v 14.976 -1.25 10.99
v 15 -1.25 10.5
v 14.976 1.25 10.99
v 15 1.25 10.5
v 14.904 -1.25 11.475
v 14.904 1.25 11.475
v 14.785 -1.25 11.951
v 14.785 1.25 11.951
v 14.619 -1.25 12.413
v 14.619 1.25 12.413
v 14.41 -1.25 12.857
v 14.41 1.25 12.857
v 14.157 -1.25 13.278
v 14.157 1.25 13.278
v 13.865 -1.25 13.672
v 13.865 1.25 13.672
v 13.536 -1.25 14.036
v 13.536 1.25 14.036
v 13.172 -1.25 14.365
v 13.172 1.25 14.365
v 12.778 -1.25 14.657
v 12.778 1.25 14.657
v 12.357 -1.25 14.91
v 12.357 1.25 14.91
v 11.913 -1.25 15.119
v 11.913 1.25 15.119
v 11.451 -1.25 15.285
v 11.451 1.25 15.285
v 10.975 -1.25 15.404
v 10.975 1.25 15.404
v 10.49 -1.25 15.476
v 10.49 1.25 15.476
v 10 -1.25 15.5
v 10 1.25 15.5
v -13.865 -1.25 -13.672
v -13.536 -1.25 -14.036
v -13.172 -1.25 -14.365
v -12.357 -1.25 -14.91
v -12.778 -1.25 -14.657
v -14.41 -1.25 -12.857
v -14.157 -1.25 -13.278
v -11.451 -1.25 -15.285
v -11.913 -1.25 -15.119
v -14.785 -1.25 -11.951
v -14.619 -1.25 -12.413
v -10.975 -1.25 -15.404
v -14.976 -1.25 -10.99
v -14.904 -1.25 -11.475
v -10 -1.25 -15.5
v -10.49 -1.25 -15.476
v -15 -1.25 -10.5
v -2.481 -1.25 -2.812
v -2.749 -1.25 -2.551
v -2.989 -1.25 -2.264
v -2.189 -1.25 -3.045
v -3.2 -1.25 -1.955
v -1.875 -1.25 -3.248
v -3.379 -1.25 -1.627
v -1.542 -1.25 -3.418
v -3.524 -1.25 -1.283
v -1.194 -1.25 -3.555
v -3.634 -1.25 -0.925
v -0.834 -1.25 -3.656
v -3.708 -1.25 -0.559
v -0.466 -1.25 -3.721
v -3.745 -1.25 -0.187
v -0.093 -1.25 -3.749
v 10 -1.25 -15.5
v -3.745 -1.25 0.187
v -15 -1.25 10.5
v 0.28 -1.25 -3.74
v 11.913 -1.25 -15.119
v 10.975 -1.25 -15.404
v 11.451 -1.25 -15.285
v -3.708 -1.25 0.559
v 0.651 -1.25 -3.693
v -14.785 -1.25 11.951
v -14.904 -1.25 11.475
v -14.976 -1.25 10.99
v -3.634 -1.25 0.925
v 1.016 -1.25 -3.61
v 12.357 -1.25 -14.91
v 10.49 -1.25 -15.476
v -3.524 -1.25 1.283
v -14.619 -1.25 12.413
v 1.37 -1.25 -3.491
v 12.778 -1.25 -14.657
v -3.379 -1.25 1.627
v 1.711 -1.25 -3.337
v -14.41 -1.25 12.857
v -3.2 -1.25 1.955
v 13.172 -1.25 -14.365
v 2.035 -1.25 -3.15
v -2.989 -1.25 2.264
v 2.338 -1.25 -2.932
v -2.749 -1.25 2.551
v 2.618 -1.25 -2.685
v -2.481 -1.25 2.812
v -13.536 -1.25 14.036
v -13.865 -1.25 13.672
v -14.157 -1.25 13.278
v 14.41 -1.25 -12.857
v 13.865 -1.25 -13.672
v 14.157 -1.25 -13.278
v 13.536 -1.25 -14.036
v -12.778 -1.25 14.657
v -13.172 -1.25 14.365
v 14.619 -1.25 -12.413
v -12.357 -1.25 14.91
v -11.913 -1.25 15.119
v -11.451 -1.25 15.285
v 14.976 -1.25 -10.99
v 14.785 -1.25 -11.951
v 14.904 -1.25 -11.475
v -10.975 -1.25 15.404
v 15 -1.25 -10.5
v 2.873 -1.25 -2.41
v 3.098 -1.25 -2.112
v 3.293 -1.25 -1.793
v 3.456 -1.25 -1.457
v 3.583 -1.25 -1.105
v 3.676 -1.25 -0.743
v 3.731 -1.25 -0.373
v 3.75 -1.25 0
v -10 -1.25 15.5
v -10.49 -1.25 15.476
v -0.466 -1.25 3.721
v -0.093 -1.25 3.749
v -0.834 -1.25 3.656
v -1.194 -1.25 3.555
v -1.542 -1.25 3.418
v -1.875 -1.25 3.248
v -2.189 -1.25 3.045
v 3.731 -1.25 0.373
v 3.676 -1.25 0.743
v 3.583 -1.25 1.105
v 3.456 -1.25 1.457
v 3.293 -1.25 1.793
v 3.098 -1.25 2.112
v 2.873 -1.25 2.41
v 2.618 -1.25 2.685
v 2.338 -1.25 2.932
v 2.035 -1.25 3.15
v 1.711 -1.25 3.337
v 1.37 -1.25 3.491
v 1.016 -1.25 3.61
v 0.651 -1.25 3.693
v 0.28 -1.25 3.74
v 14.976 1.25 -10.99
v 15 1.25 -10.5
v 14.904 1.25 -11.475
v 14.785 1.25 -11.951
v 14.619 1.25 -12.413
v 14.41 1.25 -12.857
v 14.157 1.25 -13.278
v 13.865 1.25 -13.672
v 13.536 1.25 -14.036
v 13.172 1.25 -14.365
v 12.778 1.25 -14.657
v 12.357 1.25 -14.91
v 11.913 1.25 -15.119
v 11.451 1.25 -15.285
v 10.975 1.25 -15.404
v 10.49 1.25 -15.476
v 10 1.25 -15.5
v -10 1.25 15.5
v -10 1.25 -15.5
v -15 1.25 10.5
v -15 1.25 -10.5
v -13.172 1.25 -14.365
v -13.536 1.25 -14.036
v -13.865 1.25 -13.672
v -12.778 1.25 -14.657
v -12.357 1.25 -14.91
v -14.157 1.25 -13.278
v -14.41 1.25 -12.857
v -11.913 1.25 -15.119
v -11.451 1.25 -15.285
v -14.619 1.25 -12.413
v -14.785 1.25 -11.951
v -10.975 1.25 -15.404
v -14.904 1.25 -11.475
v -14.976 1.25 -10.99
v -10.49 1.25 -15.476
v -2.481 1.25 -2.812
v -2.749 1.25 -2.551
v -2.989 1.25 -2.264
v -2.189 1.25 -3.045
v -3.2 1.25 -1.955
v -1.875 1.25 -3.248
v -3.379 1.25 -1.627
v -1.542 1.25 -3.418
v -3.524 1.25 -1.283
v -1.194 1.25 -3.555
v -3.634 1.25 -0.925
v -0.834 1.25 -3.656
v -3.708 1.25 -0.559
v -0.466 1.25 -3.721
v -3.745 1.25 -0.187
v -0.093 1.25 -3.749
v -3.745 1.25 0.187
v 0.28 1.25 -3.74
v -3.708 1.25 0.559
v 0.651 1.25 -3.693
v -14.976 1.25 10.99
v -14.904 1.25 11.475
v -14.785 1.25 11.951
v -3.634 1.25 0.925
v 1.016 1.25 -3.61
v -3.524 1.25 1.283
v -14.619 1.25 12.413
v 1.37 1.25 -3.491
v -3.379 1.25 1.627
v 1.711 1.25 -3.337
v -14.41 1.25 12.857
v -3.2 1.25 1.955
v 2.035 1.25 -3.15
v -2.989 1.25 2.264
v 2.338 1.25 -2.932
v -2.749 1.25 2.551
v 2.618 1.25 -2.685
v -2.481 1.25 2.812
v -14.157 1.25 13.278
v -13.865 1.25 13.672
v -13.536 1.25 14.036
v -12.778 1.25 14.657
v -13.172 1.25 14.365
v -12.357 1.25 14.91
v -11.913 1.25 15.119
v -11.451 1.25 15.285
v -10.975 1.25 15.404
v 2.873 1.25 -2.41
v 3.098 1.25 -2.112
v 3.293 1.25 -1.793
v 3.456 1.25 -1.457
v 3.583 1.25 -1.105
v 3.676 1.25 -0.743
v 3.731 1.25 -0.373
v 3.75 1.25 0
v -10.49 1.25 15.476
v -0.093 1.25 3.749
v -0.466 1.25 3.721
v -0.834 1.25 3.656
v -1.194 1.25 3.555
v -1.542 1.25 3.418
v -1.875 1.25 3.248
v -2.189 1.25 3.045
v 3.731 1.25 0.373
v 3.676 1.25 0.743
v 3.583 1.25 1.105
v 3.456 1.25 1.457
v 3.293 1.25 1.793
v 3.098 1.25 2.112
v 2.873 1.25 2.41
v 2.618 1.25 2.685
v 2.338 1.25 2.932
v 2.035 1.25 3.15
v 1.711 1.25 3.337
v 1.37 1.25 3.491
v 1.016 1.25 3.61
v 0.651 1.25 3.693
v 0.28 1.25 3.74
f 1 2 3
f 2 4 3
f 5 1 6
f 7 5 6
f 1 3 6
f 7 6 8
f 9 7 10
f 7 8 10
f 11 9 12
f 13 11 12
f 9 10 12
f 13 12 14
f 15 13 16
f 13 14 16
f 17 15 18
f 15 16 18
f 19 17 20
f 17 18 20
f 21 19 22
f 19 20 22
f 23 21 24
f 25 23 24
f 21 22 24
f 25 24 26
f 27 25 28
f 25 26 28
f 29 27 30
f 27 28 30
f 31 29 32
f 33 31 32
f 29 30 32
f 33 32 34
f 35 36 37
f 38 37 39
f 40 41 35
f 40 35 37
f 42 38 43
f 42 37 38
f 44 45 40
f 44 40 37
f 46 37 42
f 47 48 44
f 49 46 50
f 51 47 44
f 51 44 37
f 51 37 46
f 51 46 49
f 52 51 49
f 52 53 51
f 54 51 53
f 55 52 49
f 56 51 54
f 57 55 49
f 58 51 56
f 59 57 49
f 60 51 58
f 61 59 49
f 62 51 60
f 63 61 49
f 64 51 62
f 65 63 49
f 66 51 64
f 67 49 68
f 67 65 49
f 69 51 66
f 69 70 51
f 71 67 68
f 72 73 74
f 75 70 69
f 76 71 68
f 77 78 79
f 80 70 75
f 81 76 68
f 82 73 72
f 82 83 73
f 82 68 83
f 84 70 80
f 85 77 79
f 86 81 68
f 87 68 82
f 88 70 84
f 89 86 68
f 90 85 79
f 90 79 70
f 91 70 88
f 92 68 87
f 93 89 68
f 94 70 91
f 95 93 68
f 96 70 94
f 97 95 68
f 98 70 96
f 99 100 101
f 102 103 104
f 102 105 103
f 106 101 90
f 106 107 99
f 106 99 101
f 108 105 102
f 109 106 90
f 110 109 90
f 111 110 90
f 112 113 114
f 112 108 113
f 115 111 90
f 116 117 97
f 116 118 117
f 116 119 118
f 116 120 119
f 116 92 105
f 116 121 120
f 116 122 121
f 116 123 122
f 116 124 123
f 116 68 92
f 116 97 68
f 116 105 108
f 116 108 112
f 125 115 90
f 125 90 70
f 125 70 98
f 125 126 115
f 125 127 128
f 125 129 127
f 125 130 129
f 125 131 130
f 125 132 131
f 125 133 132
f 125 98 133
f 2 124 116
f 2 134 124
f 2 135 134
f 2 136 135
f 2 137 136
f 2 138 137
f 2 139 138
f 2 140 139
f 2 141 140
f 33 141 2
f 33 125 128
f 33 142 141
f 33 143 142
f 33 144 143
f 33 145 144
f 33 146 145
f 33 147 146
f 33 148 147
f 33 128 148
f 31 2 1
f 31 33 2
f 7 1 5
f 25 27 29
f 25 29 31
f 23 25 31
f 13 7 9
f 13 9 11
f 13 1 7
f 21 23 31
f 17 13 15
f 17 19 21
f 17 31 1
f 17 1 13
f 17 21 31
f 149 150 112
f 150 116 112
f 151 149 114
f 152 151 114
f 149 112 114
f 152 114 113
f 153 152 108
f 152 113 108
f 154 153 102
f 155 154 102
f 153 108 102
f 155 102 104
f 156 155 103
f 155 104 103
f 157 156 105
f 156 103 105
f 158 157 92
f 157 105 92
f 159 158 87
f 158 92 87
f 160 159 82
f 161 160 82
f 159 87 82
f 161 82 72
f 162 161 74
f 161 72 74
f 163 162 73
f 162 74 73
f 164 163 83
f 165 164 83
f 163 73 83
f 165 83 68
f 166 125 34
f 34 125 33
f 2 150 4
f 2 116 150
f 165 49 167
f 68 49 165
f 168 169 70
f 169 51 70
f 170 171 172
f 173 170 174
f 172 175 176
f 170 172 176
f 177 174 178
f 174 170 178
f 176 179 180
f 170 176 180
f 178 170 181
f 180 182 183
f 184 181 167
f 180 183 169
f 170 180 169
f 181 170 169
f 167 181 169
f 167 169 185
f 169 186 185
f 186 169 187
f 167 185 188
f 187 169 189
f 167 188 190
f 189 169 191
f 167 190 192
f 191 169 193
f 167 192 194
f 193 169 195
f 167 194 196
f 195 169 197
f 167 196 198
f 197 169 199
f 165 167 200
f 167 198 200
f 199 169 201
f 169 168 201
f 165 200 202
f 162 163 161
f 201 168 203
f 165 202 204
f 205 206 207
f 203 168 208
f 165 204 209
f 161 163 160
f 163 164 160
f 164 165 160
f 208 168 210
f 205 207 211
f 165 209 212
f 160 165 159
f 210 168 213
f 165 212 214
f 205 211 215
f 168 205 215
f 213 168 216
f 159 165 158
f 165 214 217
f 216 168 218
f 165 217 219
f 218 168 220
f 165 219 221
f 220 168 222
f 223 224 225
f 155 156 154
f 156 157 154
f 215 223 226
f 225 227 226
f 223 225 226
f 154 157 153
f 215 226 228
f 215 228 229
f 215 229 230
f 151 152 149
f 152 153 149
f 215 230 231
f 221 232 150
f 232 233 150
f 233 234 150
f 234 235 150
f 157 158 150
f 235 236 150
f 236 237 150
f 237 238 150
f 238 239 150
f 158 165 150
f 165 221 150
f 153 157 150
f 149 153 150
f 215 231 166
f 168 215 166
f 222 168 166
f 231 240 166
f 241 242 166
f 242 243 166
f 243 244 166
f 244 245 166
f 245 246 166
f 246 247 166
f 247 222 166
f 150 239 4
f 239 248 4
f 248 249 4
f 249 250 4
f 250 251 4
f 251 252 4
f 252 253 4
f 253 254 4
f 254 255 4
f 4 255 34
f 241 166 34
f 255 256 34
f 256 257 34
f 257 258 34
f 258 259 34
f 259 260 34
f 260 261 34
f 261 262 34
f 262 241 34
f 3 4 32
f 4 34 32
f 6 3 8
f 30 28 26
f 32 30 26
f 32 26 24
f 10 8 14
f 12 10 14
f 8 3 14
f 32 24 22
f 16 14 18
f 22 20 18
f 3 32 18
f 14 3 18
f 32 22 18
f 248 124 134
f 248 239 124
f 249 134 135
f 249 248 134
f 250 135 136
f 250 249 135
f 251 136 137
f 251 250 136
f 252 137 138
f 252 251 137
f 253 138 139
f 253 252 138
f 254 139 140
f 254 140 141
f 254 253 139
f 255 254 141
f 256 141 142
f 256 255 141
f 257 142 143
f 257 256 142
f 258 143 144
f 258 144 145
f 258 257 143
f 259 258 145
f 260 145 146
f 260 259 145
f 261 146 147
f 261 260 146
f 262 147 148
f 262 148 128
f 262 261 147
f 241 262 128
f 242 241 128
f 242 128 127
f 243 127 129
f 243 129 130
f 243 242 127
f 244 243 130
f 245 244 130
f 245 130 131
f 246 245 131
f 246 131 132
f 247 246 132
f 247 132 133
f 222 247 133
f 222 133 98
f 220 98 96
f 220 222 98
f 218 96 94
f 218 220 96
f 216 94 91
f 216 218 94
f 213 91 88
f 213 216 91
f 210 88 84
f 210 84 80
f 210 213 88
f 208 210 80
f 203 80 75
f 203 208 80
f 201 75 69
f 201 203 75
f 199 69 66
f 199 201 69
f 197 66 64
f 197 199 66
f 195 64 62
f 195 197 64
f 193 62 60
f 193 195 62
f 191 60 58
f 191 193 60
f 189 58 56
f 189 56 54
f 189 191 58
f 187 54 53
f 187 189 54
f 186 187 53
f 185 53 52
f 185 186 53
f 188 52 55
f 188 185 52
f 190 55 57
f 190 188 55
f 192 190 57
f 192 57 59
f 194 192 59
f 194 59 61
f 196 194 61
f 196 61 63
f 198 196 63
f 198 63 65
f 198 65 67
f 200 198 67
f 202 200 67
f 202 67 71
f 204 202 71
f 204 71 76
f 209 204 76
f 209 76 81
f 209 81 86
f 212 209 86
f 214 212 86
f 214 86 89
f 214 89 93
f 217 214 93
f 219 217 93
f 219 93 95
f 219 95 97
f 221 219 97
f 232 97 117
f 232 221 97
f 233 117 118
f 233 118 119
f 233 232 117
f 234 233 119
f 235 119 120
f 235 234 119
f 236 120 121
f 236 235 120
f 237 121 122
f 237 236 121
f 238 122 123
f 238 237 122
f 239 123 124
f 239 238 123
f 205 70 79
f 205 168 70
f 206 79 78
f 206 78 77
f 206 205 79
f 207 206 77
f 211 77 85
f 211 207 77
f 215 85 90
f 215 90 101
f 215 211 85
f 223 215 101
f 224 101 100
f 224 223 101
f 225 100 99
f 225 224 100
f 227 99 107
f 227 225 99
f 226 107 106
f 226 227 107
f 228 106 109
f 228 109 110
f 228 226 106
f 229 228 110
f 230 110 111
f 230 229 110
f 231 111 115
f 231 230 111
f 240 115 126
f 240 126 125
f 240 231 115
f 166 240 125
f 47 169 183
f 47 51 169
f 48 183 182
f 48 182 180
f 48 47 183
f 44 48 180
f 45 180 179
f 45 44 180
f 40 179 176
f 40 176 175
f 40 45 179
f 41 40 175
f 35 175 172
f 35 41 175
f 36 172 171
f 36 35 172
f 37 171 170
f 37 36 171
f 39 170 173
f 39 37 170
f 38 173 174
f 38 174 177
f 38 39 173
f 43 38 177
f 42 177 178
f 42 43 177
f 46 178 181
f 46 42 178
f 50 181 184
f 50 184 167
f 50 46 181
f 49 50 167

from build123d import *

# Parameters (mm, degrees)
F0_W     = 30
F0_H     = 31
F0_R     = 3.75
F1_DEPTH = 1.25
F2_R     = 5


with BuildPart() as f1:
    # F0 (on Front) → F1 (new body, symmetric)
    with BuildSketch(Plane.XZ):
        Rectangle(F0_W, F0_H)
        Circle(F0_R, mode=Mode.SUBTRACT)
    extrude(amount=F1_DEPTH, both=True)

    # F2
    f2_edges = [f1.edges().sort_by_distance(p)[0] for p in [
        (15, 0, 15.5),
        (15, 0, -15.5),
        (-15, 0, 15.5),
        (-15, 0, -15.5),
    ]]
    fillet(f2_edges, radius=F2_R)


solid = f1.part
